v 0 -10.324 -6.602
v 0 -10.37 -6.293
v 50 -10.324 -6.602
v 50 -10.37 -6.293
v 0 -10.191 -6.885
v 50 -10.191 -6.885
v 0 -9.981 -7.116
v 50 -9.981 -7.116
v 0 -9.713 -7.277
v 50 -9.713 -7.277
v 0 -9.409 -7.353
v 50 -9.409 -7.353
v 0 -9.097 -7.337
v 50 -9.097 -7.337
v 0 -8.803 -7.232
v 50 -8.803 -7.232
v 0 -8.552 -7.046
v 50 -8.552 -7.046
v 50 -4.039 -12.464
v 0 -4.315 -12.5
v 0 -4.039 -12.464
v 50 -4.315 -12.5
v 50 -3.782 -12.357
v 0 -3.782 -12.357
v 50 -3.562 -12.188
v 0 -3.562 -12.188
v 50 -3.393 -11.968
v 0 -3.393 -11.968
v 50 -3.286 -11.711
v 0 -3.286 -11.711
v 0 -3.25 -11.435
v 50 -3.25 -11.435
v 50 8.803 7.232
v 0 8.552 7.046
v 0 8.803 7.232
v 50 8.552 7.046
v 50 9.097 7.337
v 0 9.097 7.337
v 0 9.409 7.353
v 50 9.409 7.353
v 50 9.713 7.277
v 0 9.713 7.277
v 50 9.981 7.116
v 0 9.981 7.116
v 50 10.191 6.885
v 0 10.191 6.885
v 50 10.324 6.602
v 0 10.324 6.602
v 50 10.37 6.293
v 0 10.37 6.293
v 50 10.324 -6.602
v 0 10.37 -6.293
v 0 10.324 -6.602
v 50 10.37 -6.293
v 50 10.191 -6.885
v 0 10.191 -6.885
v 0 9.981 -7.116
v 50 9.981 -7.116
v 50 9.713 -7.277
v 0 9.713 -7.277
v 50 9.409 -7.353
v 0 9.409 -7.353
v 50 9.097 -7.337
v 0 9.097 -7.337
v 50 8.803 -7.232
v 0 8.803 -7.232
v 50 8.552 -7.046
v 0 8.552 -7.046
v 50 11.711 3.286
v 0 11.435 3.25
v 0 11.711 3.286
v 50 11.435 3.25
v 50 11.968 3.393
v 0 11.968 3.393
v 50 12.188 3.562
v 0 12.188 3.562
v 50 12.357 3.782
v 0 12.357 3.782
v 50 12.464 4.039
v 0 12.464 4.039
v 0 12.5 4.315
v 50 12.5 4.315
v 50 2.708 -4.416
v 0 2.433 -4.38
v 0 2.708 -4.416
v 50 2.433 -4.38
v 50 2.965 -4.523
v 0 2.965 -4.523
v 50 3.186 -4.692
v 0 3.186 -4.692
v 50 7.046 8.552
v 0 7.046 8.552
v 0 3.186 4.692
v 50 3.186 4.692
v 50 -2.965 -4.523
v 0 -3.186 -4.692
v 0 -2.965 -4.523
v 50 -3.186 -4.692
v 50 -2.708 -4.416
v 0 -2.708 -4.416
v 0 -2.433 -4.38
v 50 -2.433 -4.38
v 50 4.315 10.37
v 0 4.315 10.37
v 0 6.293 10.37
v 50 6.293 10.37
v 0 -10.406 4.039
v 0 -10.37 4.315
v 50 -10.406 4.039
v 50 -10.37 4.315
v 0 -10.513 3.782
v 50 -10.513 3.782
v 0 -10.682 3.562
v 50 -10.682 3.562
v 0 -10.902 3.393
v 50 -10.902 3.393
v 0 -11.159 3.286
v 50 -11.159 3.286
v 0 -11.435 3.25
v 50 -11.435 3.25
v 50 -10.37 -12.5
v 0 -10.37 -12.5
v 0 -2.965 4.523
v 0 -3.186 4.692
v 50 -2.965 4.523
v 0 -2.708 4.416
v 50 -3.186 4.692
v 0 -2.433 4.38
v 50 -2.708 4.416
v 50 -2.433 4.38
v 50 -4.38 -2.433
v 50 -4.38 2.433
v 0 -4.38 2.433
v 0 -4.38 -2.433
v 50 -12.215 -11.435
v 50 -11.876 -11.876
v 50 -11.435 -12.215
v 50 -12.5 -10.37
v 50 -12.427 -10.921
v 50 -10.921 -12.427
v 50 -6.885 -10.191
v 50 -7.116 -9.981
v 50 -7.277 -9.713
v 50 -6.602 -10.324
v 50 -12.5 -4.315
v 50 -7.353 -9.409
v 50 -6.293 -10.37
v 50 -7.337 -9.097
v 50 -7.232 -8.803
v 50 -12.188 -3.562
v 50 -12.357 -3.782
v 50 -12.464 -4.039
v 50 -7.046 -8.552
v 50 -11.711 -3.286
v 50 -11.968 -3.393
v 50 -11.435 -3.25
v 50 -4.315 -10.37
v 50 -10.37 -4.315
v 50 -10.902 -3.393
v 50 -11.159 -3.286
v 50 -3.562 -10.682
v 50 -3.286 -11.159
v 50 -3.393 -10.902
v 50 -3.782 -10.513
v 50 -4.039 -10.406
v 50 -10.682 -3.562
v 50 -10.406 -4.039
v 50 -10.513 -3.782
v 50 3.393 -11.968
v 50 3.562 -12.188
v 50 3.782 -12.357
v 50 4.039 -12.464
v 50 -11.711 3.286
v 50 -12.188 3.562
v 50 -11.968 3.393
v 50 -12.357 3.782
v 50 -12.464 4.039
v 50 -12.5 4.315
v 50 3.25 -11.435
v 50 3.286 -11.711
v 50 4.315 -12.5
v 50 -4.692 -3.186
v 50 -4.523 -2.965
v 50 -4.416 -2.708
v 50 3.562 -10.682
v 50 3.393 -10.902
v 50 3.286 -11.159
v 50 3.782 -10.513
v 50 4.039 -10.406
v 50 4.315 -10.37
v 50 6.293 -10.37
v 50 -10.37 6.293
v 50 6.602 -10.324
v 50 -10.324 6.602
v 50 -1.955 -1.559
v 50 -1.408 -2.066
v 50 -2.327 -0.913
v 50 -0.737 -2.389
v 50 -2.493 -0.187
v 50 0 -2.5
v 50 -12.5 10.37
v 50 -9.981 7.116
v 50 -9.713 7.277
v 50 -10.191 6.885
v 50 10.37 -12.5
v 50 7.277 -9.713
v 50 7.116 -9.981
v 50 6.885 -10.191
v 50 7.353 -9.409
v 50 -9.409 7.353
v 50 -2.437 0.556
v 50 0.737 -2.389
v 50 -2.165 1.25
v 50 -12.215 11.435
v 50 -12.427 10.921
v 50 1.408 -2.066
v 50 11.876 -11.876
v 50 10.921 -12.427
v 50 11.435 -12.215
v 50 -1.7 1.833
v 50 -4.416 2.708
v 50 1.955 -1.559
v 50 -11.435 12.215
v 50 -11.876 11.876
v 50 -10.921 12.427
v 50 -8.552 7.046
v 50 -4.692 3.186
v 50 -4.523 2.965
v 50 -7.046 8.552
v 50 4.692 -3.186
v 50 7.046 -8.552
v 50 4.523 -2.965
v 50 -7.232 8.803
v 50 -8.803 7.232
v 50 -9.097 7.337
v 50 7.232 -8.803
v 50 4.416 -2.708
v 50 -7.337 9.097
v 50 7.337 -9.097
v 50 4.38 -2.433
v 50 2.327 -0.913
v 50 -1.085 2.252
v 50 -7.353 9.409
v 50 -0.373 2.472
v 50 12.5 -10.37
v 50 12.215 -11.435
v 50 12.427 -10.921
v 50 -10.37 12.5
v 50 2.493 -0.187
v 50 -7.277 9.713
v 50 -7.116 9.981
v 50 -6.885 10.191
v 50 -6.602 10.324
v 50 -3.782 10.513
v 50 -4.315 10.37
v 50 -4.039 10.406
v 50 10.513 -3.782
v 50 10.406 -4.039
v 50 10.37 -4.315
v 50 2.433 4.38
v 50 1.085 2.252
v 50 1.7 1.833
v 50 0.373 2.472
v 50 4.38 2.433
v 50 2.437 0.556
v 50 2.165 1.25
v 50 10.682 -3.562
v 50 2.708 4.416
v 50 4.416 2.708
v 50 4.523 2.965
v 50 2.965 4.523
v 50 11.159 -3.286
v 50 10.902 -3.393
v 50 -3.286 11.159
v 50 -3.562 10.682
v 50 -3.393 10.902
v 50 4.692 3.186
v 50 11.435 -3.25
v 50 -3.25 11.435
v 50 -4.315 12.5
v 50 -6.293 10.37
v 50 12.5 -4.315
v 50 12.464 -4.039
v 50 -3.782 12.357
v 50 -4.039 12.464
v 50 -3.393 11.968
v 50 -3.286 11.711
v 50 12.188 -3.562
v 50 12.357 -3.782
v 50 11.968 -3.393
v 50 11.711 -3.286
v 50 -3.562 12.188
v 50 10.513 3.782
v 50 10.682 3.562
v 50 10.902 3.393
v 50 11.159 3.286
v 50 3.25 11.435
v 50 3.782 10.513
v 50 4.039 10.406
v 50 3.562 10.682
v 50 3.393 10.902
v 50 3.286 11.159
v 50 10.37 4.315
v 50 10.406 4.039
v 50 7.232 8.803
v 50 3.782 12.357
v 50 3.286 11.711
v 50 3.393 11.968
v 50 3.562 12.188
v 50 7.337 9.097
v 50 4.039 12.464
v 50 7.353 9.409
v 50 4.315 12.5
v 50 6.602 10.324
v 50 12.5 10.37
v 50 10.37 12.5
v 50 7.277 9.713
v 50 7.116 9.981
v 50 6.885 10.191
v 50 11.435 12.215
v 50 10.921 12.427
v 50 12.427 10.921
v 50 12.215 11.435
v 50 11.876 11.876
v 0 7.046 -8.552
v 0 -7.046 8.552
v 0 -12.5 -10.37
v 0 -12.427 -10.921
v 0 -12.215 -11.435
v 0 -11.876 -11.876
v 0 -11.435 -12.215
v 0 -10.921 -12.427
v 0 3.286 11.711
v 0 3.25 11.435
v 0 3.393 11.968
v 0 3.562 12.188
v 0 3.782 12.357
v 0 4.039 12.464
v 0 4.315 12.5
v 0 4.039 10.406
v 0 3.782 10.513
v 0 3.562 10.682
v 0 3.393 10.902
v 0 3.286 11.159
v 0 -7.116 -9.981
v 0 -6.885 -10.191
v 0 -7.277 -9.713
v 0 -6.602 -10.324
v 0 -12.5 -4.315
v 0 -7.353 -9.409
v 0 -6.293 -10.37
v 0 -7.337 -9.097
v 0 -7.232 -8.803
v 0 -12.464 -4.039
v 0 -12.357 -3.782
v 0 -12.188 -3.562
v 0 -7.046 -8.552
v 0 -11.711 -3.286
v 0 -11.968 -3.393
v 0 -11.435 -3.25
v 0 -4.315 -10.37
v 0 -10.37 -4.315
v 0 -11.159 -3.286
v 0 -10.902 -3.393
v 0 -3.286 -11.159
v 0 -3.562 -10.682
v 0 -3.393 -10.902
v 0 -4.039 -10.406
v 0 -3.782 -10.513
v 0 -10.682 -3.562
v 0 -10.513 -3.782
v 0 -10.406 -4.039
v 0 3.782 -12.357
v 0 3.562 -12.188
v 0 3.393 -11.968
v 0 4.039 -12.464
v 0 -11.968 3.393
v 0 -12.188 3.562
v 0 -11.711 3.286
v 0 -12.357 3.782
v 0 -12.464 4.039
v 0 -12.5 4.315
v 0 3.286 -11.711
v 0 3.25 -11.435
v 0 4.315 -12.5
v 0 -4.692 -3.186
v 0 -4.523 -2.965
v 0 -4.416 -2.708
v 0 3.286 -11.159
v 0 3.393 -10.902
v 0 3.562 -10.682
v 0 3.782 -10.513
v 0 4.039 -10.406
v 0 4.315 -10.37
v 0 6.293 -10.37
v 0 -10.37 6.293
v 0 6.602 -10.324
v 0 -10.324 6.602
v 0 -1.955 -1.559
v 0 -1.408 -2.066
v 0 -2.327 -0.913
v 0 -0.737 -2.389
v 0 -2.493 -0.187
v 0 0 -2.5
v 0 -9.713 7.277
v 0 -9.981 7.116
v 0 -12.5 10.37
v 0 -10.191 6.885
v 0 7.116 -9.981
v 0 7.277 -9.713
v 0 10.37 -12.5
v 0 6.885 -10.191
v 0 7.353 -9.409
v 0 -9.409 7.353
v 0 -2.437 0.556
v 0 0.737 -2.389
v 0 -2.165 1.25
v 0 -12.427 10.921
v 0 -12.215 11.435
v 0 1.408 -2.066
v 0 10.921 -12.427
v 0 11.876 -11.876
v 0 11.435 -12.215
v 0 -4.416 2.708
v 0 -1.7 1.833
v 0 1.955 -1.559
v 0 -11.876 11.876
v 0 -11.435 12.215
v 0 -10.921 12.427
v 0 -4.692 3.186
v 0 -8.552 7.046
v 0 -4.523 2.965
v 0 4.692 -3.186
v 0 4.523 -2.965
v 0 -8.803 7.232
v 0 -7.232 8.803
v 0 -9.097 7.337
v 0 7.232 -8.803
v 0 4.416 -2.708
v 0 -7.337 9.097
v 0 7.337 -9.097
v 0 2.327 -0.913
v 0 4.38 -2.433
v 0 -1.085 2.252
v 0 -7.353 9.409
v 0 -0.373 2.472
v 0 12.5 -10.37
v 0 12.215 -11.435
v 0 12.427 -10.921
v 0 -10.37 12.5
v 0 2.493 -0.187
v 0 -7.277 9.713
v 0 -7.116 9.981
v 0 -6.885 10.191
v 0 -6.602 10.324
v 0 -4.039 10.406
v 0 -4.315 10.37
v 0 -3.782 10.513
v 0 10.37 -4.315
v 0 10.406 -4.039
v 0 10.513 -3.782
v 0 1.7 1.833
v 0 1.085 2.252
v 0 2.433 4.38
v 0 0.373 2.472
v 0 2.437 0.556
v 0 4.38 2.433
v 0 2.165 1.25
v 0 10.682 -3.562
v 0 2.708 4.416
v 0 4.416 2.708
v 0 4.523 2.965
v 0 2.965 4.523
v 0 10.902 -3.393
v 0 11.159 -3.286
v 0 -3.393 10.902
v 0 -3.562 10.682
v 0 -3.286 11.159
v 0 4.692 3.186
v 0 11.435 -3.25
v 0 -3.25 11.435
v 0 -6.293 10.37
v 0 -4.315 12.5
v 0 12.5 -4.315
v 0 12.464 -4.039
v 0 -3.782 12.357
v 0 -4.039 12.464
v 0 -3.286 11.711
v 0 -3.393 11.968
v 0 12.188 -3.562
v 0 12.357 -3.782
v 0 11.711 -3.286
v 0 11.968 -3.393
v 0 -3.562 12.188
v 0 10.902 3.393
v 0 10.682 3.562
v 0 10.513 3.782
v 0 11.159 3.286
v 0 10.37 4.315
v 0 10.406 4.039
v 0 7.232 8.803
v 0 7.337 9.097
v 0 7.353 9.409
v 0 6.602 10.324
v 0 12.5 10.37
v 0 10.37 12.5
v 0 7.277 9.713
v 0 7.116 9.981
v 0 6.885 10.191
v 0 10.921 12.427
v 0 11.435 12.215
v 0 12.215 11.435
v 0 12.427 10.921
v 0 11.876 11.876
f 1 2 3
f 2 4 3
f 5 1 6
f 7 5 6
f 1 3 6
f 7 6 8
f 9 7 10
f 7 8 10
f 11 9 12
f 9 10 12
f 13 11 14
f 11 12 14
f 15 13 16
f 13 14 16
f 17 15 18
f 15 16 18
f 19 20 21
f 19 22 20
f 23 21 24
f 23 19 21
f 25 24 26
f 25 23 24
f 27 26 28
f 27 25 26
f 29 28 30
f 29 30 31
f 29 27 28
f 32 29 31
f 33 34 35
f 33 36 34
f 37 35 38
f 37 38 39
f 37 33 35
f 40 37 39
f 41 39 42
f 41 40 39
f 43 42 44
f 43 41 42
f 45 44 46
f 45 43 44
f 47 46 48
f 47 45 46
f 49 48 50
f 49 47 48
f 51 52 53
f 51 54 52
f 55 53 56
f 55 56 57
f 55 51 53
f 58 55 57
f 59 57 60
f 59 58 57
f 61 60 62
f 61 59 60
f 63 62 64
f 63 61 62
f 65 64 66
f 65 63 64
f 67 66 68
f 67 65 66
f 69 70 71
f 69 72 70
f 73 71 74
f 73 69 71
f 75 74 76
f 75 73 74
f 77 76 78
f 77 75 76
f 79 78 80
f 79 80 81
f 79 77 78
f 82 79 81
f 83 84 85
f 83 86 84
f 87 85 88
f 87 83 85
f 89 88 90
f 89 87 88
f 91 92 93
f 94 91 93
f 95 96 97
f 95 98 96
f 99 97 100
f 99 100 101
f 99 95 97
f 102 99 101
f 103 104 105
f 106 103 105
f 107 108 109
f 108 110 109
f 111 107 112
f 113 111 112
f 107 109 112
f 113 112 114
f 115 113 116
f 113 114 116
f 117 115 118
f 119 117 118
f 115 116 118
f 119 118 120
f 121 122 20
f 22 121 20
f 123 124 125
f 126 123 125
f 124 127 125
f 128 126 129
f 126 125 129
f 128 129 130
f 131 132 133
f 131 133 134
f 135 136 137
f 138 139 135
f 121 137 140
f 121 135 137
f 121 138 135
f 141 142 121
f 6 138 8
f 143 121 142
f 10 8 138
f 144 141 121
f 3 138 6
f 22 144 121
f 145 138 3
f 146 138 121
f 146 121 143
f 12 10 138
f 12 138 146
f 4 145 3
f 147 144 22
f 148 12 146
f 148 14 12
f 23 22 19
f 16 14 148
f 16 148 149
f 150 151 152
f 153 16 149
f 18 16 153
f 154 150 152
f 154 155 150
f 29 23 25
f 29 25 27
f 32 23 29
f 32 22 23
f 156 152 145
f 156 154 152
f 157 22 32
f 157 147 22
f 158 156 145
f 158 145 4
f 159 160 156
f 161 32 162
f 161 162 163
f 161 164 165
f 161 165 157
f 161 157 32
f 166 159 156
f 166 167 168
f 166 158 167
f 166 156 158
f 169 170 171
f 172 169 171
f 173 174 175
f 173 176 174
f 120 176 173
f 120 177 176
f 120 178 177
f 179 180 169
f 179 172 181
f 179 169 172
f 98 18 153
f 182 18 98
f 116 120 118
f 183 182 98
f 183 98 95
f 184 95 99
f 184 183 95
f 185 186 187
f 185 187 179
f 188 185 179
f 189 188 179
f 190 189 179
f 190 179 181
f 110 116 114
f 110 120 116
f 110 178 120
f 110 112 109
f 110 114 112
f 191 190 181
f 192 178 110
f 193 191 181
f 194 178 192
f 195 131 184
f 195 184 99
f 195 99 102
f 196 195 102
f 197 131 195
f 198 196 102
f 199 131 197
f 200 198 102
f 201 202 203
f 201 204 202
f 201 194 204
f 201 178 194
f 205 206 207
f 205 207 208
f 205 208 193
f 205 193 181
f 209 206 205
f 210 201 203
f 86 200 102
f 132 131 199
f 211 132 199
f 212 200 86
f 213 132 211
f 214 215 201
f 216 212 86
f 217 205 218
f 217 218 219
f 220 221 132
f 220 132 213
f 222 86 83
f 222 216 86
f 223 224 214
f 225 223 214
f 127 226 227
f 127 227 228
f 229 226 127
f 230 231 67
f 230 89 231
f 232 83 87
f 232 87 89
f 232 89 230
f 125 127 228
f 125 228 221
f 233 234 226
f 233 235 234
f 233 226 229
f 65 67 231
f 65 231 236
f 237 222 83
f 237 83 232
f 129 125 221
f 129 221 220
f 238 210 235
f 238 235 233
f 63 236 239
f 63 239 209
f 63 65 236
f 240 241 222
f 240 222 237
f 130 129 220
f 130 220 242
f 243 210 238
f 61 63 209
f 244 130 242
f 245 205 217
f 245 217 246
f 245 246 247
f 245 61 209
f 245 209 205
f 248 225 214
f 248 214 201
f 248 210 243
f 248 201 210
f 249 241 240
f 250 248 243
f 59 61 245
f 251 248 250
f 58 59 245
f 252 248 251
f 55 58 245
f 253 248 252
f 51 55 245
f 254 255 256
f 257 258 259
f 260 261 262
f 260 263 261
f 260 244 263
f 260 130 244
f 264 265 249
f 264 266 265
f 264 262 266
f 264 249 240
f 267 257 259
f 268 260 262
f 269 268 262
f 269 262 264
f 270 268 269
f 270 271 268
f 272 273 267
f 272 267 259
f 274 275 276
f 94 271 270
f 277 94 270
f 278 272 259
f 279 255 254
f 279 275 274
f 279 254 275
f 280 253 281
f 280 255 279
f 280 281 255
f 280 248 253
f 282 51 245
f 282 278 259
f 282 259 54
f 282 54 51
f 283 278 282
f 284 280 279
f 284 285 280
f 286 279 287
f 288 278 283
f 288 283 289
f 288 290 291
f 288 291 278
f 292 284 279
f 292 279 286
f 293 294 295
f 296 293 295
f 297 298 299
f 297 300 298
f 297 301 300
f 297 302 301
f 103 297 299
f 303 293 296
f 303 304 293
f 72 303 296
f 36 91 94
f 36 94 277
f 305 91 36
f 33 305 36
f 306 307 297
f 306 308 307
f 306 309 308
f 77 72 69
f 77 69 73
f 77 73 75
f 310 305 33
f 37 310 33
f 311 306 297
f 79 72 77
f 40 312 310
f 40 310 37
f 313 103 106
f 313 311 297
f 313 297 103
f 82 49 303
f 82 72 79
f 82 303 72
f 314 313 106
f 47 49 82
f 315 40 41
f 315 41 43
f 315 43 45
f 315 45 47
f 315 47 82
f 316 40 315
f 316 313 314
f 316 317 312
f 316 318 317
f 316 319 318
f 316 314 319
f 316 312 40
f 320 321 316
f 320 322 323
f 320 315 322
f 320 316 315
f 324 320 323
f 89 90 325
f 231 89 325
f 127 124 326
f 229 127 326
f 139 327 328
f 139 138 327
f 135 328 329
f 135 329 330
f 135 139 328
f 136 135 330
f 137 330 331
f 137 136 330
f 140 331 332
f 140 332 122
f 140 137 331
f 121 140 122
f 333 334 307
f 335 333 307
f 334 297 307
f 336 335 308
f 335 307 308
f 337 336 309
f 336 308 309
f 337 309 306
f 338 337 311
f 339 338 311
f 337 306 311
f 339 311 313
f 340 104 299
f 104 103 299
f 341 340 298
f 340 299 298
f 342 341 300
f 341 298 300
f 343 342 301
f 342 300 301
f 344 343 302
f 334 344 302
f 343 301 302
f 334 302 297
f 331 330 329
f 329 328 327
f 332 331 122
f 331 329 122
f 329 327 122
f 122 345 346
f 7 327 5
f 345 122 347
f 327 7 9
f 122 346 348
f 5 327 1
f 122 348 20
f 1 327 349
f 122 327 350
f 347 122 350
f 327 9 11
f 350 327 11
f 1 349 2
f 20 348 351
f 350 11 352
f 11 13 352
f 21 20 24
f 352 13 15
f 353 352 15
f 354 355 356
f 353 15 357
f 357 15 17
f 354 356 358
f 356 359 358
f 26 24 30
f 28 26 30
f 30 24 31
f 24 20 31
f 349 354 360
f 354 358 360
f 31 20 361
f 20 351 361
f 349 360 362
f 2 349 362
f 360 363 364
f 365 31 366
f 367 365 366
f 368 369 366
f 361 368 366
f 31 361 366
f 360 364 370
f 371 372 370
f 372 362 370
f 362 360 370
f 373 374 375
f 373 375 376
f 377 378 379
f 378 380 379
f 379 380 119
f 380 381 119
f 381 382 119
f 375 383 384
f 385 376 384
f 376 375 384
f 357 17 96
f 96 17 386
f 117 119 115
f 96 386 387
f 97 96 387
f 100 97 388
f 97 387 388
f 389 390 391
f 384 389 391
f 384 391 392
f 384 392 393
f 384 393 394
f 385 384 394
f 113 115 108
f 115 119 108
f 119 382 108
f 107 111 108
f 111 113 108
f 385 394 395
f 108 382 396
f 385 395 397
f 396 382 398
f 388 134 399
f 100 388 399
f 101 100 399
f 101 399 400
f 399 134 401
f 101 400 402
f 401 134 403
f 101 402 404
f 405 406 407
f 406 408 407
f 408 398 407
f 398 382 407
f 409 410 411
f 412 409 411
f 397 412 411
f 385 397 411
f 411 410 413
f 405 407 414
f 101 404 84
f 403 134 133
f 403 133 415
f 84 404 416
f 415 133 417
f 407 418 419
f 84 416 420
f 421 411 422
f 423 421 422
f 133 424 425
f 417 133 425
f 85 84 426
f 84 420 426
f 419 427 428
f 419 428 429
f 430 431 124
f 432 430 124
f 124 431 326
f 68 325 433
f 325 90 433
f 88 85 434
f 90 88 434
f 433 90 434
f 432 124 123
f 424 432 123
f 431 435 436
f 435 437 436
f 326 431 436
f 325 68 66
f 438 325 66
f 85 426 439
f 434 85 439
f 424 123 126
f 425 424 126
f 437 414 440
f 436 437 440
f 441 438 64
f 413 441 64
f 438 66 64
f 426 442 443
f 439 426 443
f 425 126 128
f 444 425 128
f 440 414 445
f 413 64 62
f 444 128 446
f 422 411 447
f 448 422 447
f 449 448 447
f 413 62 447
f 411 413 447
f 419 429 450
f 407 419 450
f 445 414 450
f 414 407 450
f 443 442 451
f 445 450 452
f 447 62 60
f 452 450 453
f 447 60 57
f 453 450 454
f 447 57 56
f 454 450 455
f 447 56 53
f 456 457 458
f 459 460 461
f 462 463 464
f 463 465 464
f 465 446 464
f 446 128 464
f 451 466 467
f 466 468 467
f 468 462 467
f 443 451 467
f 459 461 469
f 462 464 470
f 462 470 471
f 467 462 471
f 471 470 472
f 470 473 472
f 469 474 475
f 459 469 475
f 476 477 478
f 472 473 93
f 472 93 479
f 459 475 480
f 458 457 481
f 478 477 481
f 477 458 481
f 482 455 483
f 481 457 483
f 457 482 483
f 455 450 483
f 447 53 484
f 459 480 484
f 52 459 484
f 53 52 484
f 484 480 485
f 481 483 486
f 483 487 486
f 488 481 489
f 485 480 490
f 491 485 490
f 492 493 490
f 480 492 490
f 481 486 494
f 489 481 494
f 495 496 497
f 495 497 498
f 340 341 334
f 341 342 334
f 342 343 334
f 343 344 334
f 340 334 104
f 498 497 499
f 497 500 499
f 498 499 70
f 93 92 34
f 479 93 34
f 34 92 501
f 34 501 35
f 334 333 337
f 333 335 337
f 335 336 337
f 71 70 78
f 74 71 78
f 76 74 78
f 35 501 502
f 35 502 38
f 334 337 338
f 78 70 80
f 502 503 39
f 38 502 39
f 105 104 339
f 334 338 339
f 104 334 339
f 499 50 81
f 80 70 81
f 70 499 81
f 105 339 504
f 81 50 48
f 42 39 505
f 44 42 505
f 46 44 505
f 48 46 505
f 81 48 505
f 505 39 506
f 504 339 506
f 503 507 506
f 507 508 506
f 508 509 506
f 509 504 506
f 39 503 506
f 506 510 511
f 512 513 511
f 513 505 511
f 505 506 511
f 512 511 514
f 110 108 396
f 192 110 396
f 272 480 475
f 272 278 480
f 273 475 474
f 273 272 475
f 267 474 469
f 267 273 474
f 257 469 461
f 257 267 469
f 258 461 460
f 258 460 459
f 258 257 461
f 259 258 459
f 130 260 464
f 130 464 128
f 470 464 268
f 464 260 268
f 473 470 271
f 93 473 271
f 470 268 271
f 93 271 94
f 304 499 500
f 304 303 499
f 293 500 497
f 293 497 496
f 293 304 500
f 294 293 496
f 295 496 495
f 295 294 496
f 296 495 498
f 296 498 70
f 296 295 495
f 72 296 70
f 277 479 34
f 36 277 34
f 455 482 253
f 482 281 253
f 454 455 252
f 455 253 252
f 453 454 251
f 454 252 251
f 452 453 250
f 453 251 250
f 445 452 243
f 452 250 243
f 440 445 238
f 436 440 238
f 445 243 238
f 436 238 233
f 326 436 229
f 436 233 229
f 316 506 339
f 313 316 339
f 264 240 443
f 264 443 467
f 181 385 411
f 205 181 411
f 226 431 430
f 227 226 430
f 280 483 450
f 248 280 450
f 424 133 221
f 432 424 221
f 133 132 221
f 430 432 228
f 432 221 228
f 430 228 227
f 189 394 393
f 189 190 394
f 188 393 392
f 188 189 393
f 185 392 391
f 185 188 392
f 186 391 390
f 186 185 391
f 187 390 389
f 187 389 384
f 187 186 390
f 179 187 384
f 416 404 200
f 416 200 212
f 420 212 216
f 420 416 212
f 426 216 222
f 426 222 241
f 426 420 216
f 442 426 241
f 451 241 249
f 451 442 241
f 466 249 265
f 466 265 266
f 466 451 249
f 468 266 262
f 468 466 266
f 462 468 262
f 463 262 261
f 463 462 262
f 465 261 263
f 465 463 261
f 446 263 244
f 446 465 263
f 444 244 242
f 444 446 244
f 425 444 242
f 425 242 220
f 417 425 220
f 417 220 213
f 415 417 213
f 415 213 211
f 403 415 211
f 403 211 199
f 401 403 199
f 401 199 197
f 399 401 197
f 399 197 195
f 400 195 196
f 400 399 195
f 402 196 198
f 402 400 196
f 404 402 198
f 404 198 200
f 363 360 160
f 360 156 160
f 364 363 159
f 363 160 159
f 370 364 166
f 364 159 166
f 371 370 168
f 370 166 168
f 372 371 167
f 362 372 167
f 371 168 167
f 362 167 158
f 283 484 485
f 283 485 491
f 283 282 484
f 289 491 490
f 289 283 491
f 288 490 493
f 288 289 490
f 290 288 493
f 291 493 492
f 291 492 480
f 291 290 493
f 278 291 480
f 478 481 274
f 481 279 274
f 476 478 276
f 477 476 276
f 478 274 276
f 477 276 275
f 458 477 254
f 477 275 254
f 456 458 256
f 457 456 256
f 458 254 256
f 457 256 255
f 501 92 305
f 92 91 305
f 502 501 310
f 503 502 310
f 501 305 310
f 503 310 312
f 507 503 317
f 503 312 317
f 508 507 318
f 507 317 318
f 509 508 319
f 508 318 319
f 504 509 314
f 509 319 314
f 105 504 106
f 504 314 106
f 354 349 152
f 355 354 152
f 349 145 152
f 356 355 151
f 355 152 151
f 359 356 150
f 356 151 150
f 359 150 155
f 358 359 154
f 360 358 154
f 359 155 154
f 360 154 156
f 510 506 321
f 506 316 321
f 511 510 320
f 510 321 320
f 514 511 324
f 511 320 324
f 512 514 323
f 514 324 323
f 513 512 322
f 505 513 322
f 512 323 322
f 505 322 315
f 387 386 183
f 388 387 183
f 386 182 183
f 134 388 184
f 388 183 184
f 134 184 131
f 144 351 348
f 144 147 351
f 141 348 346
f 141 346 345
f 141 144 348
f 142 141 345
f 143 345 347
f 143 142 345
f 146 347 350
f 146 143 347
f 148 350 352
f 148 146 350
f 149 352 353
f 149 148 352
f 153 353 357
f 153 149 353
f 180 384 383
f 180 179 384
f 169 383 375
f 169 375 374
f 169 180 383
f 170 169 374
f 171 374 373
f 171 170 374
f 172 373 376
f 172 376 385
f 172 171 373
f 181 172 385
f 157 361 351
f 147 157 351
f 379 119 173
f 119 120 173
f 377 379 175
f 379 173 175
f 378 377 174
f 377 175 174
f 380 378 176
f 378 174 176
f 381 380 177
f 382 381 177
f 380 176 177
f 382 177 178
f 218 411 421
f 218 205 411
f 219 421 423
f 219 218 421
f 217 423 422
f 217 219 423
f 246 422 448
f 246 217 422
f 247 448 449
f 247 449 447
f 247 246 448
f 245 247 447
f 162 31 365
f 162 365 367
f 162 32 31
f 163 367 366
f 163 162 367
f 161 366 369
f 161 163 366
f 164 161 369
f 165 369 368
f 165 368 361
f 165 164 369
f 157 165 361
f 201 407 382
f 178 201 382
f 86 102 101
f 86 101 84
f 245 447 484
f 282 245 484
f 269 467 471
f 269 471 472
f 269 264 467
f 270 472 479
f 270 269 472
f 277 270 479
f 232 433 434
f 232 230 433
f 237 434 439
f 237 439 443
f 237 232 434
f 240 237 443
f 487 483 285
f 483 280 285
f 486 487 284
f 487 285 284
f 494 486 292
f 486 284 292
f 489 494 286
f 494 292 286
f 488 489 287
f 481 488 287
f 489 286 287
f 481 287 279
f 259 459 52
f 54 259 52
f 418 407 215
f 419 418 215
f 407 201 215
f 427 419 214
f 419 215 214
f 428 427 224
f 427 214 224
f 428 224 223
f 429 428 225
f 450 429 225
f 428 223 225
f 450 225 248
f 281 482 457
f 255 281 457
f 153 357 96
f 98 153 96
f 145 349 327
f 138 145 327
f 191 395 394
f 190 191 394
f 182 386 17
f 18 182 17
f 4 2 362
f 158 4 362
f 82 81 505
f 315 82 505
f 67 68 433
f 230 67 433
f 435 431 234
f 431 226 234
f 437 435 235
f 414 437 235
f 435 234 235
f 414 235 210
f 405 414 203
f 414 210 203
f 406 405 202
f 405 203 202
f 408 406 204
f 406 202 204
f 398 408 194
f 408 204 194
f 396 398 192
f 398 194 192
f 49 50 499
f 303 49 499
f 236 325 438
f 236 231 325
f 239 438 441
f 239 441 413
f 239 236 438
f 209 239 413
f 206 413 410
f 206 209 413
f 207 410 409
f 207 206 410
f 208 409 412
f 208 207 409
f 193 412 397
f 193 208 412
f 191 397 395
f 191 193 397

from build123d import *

# Parameters (mm, degrees)
SKETCH1_R           = 2.5
BOSS_EXTRUDE1_DEPTH = 50
FILLET1_R           = 1.065
FILLET2_R           = 2.13


with BuildPart() as part:
    # Sketch1 → Boss-Extrude1 (new body)
    with BuildSketch(Plane.YZ):
        Polygon((-12.5, -3.25), (-12.5, -12.5), (-3.25, -12.5), (-3.25, -10.37), (-8.863862556, -10.37), (-2.873862556, -4.38), (2.873862556, -4.38), (8.863862556, -10.37), (3.25, -10.37), (3.25, -12.5), (12.5, -12.5), (12.5, -3.25), (10.37, -3.25), (10.37, -8.863862556), (4.38, -2.873862556), (4.38, 2.873862556), (10.37, 8.863862556), (10.37, 3.25), (12.5, 3.25), (12.5, 12.5), (3.25, 12.5), (3.25, 10.37), (8.863862556, 10.37), (2.873862556, 4.38), (-2.873862556, 4.38), (-8.863862556, 10.37), (-3.25, 10.37), (-3.25, 12.5), (-12.5, 12.5), (-12.5, 3.25), (-10.37, 3.25), (-10.37, 8.863862556), (-4.38, 2.873862556), (-4.38, -2.873862556), (-10.37, -8.863862556), (-10.37, -3.25), align=None)
        with Locations(Location((0, 0, 0), (0, 0, 270))):
            Circle(SKETCH1_R, mode=Mode.SUBTRACT)
    extrude(amount=BOSS_EXTRUDE1_DEPTH)

    # Fillet1
    fillet1_edges = [part.edges().sort_by_distance(p)[0] for p in [
        (25, -10.37, -8.863862556),
        (25, 2.873862556, -4.38),
        (25, -2.873862556, -4.38),
        (25, -4.38, 2.873862556),
        (25, -4.38, -2.873862556),
        (25, -2.873862556, 4.38),
        (25, 2.873862556, 4.38),
        (25, 4.38, 2.873862556),
        (25, 4.38, -2.873862556),
        (25, -8.863862556, -10.37),
        (25, 8.863862556, -10.37),
        (25, 10.37, -8.863862556),
        (25, -10.37, 8.863862556),
        (25, -8.863862556, 10.37),
        (25, 10.37, 8.863862556),
        (25, 8.863862556, 10.37),
        (25, 12.5, 3.25),
        (25, -3.25, -12.5),
        (25, -10.37, 3.25),
        (25, 10.37, 3.25),
        (25, -10.37, -3.25),
        (25, -12.5, -3.25),
        (25, -12.5, 3.25),
        (25, 3.25, -10.37),
        (25, -3.25, -10.37),
        (25, 3.25, -12.5),
        (25, 10.37, -3.25),
        (25, 12.5, -3.25),
        (25, 3.25, 12.5),
        (25, 3.25, 10.37),
        (25, -3.25, 10.37),
        (25, -3.25, 12.5),
    ]]
    fillet(fillet1_edges, radius=FILLET1_R - 0.0001)  # a hair under: the kernel refuses the full size

    # Fillet2
    fillet2_edges = [part.edges().sort_by_distance(p)[0] for p in [
        (25, -12.5, 12.5),
        (25, 12.5, 12.5),
        (25, 12.5, -12.5),
        (25, -12.5, -12.5),
    ]]
    fillet(fillet2_edges, radius=FILLET2_R)


solid = part.part
